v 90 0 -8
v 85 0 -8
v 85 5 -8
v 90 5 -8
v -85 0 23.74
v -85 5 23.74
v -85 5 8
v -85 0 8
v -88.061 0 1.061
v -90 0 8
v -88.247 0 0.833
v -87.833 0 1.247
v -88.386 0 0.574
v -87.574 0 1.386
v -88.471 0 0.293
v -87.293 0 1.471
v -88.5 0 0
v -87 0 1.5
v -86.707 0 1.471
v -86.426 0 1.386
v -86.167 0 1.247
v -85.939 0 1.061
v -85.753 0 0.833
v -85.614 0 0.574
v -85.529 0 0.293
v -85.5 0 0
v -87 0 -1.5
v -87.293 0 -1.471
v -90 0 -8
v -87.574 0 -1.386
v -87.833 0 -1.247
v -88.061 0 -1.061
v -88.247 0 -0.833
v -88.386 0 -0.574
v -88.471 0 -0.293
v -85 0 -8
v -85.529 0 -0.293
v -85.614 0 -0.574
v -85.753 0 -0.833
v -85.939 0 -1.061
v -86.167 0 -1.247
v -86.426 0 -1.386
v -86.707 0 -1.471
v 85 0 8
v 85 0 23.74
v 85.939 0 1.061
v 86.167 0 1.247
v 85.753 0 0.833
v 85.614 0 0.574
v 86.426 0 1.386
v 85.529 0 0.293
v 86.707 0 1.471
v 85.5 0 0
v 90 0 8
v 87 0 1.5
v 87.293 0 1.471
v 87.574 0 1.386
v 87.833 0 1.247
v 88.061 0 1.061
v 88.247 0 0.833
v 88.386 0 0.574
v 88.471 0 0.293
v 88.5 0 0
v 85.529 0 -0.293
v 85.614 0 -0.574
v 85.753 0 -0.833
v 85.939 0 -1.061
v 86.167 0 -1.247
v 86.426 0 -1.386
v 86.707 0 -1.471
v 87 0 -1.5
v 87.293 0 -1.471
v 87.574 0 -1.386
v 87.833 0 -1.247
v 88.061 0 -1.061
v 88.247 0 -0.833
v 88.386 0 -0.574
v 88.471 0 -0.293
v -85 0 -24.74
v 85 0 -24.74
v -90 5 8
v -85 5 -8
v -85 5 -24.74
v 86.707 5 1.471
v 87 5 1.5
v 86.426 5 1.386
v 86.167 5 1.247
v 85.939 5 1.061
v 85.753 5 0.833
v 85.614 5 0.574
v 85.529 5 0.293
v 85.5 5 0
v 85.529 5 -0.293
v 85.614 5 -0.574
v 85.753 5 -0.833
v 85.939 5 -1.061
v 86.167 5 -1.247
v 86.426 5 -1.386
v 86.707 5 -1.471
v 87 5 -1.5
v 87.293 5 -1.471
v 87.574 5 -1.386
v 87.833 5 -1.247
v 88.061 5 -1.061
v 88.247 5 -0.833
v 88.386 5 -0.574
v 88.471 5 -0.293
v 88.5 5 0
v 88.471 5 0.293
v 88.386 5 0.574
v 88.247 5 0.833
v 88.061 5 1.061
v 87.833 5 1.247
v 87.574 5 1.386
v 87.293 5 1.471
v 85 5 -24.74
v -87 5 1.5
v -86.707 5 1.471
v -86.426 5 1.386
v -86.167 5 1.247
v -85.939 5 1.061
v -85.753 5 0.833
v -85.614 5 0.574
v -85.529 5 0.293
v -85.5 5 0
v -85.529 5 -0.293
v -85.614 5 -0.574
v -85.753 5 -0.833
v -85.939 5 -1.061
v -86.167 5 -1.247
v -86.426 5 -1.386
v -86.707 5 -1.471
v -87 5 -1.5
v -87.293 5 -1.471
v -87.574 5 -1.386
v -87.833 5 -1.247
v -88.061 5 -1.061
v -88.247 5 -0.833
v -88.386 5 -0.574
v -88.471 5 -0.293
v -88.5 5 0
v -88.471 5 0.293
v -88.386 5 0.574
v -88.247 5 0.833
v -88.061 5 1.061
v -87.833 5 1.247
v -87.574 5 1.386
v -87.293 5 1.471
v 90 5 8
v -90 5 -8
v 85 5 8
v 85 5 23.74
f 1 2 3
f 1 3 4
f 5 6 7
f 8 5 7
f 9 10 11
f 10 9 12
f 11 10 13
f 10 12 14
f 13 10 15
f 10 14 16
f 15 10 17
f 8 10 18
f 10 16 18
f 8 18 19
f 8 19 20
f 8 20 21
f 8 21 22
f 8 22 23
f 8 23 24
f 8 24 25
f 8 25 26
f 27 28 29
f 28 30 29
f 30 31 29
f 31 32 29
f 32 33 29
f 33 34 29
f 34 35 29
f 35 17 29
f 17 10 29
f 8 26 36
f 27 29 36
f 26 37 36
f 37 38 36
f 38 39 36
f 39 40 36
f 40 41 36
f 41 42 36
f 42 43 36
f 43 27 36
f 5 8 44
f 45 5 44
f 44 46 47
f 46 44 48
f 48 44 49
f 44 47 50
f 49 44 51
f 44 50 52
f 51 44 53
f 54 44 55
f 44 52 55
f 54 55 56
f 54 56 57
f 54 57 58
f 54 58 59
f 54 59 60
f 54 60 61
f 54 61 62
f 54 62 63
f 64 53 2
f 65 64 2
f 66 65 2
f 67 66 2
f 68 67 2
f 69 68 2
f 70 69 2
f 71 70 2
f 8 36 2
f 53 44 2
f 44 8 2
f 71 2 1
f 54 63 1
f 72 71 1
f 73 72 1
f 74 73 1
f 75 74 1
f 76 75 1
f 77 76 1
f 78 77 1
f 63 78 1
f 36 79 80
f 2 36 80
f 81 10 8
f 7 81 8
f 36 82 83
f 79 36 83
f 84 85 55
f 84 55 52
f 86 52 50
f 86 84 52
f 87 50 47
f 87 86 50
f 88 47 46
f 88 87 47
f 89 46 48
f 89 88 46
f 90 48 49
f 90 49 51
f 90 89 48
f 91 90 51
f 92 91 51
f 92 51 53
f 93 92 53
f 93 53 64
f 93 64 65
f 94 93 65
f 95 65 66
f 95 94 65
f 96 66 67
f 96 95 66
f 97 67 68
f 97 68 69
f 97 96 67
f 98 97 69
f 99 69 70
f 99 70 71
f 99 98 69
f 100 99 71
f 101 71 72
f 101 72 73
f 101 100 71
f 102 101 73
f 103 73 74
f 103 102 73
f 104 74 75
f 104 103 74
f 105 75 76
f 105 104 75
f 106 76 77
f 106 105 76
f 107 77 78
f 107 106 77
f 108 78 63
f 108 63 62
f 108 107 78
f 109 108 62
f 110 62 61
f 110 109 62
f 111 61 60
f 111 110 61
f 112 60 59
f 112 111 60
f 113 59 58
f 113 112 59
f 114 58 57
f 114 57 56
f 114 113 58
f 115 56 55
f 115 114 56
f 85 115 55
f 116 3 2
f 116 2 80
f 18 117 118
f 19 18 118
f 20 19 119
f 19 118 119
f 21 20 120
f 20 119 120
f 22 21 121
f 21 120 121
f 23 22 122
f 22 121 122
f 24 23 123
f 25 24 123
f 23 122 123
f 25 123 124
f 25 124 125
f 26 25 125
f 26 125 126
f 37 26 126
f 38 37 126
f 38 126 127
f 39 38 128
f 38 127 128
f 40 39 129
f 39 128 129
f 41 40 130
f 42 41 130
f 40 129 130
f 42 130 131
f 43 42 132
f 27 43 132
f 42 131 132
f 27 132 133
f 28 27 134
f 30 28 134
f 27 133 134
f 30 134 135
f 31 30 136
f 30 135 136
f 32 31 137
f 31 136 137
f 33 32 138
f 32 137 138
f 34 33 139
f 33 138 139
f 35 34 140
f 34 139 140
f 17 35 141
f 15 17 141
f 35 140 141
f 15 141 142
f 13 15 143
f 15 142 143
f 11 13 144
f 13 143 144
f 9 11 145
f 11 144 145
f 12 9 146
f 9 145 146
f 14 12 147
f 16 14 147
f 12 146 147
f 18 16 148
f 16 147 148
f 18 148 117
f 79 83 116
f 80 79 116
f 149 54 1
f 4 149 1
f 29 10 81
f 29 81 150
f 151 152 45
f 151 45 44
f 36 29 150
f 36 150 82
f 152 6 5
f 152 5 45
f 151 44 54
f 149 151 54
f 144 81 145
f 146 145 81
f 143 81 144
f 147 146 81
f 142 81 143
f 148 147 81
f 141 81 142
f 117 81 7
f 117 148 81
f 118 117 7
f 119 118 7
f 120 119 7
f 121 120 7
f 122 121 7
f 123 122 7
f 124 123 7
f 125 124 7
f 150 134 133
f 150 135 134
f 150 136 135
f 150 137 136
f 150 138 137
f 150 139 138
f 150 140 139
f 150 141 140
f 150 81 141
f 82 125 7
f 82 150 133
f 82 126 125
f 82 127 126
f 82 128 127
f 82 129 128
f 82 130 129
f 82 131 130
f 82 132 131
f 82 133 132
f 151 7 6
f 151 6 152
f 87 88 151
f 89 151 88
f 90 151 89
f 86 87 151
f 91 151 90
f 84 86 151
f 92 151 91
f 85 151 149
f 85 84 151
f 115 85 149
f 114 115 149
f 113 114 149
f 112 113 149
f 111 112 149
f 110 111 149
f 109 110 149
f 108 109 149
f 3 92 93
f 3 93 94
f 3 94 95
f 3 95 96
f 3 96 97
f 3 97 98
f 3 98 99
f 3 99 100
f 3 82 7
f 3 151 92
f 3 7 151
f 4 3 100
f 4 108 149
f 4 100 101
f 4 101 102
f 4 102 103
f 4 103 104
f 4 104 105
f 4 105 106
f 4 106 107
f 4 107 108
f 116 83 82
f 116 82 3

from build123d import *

# Parameters (mm, degrees)
CROQUIS1_W              = 180
CROQUIS1_H              = 16
SALIENTE_EXTRUIR1_DEPTH = 5
CROQUIS2_W              = 170
CROQUIS2_H              = 17.74
SALIENTE_EXTRUIR2_DEPTH = 5
CROQUIS3_R              = 1.5
CORTAR_EXTRUIR1_DEPTH   = 5
CROQUIS4_W              = 170
CROQUIS4_H              = 2
CORTAR_EXTRUIR2_DEPTH   = 94.741920185
CROQUIS5_W              = 170
CROQUIS5_H              = 1
CORTAR_EXTRUIR3_DEPTH   = 10


with BuildPart() as part:
    # Croquis1 → Saliente-Extruir1 (new body)
    with BuildSketch(Plane(origin=(0, 0, 0), x_dir=(1, 0, 0), z_dir=(0, 1, 0))):
        Rectangle(CROQUIS1_W, CROQUIS1_H)
    extrude(amount=SALIENTE_EXTRUIR1_DEPTH)

    # Croquis2 → Saliente-Extruir2 (add)
    with BuildSketch(Plane(origin=(0, 5, 0), x_dir=(1, 0, 0), z_dir=(0, 1, 0))):
        with Locations((0, 16.87)):
            Rectangle(CROQUIS2_W, CROQUIS2_H)
        with Locations((0, -16.87)):
            Rectangle(CROQUIS2_W, CROQUIS2_H)
    extrude(amount=-SALIENTE_EXTRUIR2_DEPTH)

    # Croquis3 → Cortar-Extruir1 (cut)
    with BuildSketch(Plane(origin=(0, 5, 0), x_dir=(1, 0, 0), z_dir=(0, 1, 0))):
        with Locations(Location((-87, 0, 0), (0, 0, 270))):
            Circle(CROQUIS3_R)
    cortar_extruir1 = extrude(amount=-CORTAR_EXTRUIR1_DEPTH, mode=Mode.SUBTRACT)

    # Simetría1: Cortar-Extruir1 across plane
    add(cortar_extruir1.mirror(Plane(origin=(0, 0, 0), x_dir=(0, 0, 1), z_dir=(1, 0, 0))), mode=Mode.SUBTRACT)

    # Croquis4 → Cortar-Extruir2 (cut, through all)
    with BuildSketch(Plane(origin=(0, 5, 0), x_dir=(1, 0, 0), z_dir=(0, 1, 0))):
        with Locations((0, -24.74)):
            Rectangle(CROQUIS4_W, CROQUIS4_H)
    extrude(amount=-CORTAR_EXTRUIR2_DEPTH, mode=Mode.SUBTRACT)

    # Croquis5 → Cortar-Extruir3 (cut)
    with BuildSketch(Plane(origin=(0, 5, 0), x_dir=(1, 0, 0), z_dir=(0, 1, 0))):
        with Locations((0, 25.24)):
            Rectangle(CROQUIS5_W, CROQUIS5_H)
    extrude(amount=-CORTAR_EXTRUIR3_DEPTH, mode=Mode.SUBTRACT)


solid = part.part
